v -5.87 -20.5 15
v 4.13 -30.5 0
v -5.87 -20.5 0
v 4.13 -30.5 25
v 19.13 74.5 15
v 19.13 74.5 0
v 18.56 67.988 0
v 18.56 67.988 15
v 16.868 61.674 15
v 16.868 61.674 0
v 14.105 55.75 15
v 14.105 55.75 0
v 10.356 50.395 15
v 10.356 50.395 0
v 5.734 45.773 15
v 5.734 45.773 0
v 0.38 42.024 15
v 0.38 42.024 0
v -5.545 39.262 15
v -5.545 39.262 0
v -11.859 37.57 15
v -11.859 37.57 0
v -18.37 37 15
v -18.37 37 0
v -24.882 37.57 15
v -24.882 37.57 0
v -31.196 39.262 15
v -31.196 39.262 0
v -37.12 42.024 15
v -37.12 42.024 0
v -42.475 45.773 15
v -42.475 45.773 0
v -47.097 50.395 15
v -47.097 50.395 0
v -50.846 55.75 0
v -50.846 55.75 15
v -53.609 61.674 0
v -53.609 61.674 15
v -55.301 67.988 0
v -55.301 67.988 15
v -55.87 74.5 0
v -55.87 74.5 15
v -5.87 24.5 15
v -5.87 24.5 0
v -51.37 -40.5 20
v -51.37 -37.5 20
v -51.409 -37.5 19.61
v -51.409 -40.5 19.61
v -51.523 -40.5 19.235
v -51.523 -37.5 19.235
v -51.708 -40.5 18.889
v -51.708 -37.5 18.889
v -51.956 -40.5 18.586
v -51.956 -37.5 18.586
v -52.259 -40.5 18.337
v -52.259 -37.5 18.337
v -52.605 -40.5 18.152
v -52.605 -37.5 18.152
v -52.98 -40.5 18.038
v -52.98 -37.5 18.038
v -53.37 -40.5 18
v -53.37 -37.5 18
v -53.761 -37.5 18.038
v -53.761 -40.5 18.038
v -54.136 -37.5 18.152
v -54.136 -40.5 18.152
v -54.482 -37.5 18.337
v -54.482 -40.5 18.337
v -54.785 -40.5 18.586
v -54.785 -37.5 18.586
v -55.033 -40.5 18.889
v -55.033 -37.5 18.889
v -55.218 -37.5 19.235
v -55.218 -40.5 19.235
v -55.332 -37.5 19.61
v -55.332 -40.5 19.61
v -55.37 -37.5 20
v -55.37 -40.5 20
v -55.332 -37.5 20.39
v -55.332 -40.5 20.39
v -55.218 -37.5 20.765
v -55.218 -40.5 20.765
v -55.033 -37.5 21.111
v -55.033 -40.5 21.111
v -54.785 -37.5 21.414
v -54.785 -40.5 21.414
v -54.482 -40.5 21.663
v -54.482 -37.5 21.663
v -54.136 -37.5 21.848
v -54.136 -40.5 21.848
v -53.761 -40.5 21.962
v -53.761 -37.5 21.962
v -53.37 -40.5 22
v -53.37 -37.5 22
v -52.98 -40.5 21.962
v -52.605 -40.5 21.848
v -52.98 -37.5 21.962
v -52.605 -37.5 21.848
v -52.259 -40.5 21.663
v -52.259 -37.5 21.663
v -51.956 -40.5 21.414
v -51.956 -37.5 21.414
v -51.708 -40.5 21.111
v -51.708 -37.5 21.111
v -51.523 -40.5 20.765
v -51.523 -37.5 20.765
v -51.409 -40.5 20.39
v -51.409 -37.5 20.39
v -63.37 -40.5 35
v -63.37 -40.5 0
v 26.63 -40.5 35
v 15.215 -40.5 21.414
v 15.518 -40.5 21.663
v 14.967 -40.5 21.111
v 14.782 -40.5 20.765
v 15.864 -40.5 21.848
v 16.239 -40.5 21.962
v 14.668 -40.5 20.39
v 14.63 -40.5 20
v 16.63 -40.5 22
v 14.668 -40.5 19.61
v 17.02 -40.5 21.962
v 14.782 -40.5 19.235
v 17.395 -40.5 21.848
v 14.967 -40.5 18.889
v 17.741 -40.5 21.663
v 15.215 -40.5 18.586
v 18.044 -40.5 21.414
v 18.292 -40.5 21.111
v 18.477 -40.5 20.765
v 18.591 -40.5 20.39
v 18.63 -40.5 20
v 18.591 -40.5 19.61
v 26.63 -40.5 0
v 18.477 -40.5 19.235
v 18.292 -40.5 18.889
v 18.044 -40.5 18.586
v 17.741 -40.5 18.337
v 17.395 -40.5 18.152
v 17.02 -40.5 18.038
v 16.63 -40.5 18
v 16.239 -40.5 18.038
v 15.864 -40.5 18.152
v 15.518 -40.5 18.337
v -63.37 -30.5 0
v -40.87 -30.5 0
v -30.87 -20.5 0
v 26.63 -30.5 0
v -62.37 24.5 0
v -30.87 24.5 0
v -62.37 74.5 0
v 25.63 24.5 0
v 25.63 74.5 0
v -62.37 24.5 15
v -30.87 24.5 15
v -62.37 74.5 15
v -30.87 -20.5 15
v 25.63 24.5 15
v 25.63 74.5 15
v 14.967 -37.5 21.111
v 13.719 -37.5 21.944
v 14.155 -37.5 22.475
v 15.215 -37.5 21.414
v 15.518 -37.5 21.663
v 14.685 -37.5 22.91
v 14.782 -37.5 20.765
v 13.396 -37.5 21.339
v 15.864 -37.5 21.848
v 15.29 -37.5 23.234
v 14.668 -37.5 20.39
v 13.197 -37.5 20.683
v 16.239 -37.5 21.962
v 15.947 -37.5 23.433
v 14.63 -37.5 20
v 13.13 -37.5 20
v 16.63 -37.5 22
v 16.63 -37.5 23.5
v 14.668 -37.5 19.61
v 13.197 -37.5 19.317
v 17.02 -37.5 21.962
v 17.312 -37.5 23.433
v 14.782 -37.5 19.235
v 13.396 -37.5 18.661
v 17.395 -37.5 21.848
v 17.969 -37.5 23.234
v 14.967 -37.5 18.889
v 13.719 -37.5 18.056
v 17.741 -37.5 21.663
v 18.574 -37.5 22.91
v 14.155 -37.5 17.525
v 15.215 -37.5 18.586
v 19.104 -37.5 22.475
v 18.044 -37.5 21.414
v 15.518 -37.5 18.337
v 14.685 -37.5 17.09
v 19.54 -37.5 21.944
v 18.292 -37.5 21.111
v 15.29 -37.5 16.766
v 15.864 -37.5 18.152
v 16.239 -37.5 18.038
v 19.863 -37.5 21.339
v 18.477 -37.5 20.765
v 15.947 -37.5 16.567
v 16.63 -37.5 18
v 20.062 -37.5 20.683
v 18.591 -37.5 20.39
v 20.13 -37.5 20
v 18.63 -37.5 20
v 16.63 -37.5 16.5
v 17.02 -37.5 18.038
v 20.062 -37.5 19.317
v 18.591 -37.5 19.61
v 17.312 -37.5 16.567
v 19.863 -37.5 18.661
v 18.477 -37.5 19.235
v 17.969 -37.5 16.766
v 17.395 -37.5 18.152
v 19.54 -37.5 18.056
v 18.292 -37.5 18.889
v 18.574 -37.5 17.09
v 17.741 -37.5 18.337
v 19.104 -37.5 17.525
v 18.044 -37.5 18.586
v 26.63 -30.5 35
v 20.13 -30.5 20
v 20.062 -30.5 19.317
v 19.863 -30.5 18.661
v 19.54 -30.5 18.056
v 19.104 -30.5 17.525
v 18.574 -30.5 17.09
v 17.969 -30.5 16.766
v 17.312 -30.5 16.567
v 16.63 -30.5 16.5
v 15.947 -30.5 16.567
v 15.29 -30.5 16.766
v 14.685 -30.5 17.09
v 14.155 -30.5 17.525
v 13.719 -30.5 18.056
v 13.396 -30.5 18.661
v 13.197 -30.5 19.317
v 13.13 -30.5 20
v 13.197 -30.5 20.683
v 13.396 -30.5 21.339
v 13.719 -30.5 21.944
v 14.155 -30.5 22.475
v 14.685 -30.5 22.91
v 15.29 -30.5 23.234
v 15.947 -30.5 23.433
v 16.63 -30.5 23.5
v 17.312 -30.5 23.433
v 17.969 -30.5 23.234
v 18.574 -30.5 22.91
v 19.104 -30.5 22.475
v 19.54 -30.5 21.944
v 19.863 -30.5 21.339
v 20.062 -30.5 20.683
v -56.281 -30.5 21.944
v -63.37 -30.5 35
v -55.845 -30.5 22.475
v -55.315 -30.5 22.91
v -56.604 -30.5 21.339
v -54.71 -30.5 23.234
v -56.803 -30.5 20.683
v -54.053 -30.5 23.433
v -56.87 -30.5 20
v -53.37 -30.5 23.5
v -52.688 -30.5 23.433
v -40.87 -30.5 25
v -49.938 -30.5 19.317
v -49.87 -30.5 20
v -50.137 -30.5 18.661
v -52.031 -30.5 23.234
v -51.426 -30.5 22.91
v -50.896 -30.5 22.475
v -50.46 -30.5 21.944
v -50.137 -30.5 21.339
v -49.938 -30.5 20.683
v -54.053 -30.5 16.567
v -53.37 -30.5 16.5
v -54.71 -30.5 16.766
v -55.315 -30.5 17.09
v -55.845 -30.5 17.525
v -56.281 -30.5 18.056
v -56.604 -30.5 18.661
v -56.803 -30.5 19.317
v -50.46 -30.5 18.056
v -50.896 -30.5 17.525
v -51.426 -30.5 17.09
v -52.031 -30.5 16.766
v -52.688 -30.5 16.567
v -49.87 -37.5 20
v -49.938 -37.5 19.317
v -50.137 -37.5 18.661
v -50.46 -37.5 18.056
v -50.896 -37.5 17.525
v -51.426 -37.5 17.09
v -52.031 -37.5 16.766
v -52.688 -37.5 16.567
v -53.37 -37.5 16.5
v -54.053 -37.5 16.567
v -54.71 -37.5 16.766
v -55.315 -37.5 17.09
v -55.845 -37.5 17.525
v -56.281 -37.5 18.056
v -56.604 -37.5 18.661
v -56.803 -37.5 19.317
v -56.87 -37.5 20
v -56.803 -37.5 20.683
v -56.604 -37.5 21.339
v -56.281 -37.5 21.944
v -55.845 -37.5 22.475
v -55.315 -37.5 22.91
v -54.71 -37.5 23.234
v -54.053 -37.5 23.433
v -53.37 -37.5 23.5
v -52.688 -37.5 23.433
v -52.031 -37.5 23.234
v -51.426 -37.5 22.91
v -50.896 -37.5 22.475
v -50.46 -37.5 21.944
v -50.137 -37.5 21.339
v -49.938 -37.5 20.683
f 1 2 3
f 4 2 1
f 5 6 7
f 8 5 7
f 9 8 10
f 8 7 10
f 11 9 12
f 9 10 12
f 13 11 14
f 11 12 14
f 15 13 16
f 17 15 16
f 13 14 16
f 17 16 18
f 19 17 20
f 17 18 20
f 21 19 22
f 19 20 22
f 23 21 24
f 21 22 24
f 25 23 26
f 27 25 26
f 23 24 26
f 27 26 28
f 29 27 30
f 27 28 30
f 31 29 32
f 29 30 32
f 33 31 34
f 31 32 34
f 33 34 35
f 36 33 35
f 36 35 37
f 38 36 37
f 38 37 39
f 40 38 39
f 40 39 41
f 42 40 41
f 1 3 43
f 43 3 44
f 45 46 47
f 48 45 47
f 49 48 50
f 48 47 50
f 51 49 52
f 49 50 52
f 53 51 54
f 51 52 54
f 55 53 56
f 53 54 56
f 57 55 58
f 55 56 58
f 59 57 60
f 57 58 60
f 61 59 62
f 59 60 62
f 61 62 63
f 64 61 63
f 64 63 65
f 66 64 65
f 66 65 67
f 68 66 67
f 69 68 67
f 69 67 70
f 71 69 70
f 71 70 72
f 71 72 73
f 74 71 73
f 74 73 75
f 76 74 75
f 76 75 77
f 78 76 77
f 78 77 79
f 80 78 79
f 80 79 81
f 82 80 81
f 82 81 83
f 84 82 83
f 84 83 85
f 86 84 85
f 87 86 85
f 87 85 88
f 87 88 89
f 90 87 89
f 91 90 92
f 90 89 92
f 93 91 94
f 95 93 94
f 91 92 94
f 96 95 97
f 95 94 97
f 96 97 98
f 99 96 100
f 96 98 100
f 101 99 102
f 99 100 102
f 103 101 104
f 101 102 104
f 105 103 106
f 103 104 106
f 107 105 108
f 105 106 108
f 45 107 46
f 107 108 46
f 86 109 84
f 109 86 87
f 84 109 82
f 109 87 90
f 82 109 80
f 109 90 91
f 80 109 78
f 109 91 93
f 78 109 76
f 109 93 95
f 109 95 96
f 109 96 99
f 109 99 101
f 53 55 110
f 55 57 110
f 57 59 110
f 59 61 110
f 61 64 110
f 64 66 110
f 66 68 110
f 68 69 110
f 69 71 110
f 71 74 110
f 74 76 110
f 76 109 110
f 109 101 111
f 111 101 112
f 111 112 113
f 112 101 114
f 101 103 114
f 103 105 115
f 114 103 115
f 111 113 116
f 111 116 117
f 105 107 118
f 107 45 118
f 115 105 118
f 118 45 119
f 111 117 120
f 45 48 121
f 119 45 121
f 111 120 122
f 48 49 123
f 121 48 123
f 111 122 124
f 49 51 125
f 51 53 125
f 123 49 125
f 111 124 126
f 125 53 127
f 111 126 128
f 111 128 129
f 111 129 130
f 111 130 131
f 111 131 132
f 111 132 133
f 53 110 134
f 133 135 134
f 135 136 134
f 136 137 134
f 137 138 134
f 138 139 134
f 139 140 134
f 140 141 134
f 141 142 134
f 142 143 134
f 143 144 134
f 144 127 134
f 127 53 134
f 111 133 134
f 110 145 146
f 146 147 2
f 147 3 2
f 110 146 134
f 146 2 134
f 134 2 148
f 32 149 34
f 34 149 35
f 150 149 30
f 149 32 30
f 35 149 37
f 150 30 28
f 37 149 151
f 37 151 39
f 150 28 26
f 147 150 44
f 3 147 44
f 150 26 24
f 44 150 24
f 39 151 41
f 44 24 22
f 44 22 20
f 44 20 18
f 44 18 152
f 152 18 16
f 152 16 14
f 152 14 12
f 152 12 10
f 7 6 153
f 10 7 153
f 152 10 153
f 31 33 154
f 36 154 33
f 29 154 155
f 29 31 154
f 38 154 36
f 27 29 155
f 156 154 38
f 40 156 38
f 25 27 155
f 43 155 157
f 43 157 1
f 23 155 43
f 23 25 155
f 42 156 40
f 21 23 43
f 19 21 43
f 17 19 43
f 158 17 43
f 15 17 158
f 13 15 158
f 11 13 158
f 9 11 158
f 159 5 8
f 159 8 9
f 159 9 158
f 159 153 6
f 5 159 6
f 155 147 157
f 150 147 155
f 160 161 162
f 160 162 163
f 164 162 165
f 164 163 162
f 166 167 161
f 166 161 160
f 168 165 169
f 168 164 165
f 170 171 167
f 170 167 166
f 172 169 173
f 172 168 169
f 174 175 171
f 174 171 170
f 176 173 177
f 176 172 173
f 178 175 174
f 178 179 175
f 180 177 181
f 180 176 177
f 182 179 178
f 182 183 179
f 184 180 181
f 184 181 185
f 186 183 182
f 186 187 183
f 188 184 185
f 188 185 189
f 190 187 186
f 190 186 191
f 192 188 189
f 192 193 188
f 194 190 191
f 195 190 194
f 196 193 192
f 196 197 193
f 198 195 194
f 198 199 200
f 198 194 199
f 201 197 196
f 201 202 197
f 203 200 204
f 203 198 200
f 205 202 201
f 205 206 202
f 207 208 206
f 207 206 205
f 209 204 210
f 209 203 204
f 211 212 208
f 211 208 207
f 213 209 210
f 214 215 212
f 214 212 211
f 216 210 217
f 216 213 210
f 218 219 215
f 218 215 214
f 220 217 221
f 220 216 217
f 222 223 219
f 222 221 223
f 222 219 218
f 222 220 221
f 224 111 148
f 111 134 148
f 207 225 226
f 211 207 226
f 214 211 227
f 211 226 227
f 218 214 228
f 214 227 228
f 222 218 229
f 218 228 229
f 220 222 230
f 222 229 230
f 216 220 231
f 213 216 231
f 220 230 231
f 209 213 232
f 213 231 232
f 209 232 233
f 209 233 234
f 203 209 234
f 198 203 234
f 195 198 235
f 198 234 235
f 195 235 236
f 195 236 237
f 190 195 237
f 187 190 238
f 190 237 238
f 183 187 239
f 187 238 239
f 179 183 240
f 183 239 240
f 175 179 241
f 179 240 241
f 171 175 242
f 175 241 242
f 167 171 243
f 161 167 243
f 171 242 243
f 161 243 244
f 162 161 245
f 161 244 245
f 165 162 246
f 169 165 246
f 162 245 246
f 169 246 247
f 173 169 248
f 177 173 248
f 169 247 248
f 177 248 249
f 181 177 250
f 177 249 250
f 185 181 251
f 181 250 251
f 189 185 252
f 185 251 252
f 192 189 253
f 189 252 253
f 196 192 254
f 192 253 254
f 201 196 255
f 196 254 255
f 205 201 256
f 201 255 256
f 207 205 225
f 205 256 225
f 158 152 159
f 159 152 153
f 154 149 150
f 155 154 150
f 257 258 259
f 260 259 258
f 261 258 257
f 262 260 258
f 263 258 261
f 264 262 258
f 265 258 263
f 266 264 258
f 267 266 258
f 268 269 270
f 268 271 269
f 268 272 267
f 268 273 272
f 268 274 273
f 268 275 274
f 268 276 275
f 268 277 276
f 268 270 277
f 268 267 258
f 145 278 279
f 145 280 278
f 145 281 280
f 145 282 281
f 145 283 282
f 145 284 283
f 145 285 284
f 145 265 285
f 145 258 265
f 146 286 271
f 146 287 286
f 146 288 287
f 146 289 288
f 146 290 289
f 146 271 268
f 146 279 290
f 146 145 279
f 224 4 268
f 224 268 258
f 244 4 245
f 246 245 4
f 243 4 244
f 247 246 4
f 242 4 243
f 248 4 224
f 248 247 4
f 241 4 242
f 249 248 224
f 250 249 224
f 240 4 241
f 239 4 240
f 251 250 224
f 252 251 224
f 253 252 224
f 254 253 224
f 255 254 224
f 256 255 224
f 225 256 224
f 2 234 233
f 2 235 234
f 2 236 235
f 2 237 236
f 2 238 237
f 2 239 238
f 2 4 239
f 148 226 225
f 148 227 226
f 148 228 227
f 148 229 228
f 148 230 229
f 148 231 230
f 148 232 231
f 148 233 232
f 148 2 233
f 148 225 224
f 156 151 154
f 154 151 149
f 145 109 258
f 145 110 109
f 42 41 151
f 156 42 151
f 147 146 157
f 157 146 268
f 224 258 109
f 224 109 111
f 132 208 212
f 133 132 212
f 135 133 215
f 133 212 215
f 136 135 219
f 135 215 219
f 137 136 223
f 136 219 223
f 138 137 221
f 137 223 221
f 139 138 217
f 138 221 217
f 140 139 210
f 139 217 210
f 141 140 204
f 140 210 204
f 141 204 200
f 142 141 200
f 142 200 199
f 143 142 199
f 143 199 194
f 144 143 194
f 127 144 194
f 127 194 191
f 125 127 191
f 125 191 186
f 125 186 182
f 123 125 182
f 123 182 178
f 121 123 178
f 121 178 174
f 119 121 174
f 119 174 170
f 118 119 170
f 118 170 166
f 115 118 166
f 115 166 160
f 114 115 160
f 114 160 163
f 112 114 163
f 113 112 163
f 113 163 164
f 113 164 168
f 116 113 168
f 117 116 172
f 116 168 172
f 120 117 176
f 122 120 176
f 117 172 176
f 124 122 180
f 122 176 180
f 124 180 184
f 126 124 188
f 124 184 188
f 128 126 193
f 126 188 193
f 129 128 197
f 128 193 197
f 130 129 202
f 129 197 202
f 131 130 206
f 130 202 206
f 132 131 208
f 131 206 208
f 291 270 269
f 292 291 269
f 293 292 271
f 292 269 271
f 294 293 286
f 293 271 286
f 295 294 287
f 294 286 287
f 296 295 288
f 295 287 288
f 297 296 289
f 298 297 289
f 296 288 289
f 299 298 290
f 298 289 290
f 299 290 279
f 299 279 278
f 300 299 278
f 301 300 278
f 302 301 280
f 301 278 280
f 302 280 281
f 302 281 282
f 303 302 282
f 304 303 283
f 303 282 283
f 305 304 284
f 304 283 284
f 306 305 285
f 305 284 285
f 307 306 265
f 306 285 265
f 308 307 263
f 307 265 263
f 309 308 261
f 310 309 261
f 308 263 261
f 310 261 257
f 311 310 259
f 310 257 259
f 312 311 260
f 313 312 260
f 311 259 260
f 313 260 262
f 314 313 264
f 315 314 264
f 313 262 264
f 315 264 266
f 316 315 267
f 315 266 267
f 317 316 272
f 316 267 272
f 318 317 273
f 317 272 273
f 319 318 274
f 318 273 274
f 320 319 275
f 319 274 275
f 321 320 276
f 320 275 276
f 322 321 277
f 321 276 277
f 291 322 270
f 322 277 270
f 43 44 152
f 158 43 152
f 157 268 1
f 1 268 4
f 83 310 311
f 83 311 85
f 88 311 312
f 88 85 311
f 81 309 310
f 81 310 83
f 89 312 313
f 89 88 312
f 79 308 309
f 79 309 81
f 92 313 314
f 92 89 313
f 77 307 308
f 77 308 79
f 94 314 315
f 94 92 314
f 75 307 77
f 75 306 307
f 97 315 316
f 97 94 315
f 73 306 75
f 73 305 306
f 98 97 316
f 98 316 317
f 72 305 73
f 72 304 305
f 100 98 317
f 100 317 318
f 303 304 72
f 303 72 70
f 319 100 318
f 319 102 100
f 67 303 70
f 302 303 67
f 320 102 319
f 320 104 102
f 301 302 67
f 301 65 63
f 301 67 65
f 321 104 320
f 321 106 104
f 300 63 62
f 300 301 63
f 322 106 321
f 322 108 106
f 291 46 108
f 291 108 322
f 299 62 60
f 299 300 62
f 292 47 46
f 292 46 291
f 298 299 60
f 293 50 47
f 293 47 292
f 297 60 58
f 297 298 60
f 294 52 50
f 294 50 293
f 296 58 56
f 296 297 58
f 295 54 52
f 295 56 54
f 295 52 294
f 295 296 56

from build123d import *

# Parameters (mm, degrees)
SKETCH_1_W          = 25
SKETCH_1_H          = 55
SKETCH_1_W_2        = 90
SKETCH_1_H_2        = 10
EXTRUDE_1_DEPTH     = 15
SKETCH_2_W          = 90
SKETCH_2_H          = 10
EXTRUDE_2_DEPTH     = 20
CHAMFER_4_SIZE      = 10
SKETCH_4_R          = 2
CUT_EXTRUDE_1_DEPTH = 11
SKETCH_5_R          = 3.5
CUT_EXTRUDE_2_DEPTH = 7


with BuildPart() as part:
    # 草圖1 → 填料-伸長1 (new body)
    with BuildSketch(Plane.XY):
        with BuildLine():
            Line((-62.370495495, 24.5), (-30.870495495, 24.5))
            Line((-30.870495495, 24.5), (-5.870495495, 24.5))
            Line((-5.870495495, 24.5), (25.629504505, 24.5))
            Line((25.629504505, 24.5), (25.629504505, 74.5))
            Line((25.629504505, 74.5), (19.129504505, 74.5))
            ThreePointArc((19.129504505, 74.5), (-18.370495495, 37), (-55.870495495, 74.5))
            Line((-55.870495495, 74.5), (-62.370495495, 74.5))
            Line((-62.370495495, 74.5), (-62.370495495, 24.5))
        make_face()
        with Locations((-18.370495495, -3)):
            Rectangle(SKETCH_1_W, SKETCH_1_H)
        with Locations((-18.370495495, -35.5)):
            Rectangle(SKETCH_1_W_2, SKETCH_1_H_2)
    extrude(amount=EXTRUDE_1_DEPTH)

    # 草圖2 → 填料-伸長2 (add)
    with BuildSketch(Plane.XY.offset(15)):
        with Locations((-18.370495495, -35.5)):
            Rectangle(SKETCH_2_W, SKETCH_2_H)
    extrude(amount=EXTRUDE_2_DEPTH)

    # 導角4
    chamfer_4_edges = [part.edges().sort_by_distance(p)[0] for p in [
        (-5.870495495, -30.5, 7.5),
        (-30.870495495, -30.5, 7.5),
        (-18.370495495, -30.5, 15),
    ]]
    chamfer(chamfer_4_edges, length=CHAMFER_4_SIZE)

    # 草圖4 → 除料-伸長1 (cut, through all)
    with BuildSketch(Plane(origin=(0, -30.5, 0), x_dir=(1, 0, 0), z_dir=(0, 1, 0))):
        with Locations((-53.370495495, -20)):
            Circle(SKETCH_4_R)
        with Locations((16.629504505, -20)):
            Circle(SKETCH_4_R)
    extrude(amount=-CUT_EXTRUDE_1_DEPTH, mode=Mode.SUBTRACT)

    # 草圖5 → 除料-伸長2 (cut)
    with BuildSketch(Plane(origin=(0, -30.5, 0), x_dir=(1, 0, 0), z_dir=(0, 1, 0))):
        with Locations((-53.370495495, -20)):
            Circle(SKETCH_5_R)
        with Locations((16.629504505, -20)):
            Circle(SKETCH_5_R)
    extrude(amount=-CUT_EXTRUDE_2_DEPTH, mode=Mode.SUBTRACT)


solid = part.part
